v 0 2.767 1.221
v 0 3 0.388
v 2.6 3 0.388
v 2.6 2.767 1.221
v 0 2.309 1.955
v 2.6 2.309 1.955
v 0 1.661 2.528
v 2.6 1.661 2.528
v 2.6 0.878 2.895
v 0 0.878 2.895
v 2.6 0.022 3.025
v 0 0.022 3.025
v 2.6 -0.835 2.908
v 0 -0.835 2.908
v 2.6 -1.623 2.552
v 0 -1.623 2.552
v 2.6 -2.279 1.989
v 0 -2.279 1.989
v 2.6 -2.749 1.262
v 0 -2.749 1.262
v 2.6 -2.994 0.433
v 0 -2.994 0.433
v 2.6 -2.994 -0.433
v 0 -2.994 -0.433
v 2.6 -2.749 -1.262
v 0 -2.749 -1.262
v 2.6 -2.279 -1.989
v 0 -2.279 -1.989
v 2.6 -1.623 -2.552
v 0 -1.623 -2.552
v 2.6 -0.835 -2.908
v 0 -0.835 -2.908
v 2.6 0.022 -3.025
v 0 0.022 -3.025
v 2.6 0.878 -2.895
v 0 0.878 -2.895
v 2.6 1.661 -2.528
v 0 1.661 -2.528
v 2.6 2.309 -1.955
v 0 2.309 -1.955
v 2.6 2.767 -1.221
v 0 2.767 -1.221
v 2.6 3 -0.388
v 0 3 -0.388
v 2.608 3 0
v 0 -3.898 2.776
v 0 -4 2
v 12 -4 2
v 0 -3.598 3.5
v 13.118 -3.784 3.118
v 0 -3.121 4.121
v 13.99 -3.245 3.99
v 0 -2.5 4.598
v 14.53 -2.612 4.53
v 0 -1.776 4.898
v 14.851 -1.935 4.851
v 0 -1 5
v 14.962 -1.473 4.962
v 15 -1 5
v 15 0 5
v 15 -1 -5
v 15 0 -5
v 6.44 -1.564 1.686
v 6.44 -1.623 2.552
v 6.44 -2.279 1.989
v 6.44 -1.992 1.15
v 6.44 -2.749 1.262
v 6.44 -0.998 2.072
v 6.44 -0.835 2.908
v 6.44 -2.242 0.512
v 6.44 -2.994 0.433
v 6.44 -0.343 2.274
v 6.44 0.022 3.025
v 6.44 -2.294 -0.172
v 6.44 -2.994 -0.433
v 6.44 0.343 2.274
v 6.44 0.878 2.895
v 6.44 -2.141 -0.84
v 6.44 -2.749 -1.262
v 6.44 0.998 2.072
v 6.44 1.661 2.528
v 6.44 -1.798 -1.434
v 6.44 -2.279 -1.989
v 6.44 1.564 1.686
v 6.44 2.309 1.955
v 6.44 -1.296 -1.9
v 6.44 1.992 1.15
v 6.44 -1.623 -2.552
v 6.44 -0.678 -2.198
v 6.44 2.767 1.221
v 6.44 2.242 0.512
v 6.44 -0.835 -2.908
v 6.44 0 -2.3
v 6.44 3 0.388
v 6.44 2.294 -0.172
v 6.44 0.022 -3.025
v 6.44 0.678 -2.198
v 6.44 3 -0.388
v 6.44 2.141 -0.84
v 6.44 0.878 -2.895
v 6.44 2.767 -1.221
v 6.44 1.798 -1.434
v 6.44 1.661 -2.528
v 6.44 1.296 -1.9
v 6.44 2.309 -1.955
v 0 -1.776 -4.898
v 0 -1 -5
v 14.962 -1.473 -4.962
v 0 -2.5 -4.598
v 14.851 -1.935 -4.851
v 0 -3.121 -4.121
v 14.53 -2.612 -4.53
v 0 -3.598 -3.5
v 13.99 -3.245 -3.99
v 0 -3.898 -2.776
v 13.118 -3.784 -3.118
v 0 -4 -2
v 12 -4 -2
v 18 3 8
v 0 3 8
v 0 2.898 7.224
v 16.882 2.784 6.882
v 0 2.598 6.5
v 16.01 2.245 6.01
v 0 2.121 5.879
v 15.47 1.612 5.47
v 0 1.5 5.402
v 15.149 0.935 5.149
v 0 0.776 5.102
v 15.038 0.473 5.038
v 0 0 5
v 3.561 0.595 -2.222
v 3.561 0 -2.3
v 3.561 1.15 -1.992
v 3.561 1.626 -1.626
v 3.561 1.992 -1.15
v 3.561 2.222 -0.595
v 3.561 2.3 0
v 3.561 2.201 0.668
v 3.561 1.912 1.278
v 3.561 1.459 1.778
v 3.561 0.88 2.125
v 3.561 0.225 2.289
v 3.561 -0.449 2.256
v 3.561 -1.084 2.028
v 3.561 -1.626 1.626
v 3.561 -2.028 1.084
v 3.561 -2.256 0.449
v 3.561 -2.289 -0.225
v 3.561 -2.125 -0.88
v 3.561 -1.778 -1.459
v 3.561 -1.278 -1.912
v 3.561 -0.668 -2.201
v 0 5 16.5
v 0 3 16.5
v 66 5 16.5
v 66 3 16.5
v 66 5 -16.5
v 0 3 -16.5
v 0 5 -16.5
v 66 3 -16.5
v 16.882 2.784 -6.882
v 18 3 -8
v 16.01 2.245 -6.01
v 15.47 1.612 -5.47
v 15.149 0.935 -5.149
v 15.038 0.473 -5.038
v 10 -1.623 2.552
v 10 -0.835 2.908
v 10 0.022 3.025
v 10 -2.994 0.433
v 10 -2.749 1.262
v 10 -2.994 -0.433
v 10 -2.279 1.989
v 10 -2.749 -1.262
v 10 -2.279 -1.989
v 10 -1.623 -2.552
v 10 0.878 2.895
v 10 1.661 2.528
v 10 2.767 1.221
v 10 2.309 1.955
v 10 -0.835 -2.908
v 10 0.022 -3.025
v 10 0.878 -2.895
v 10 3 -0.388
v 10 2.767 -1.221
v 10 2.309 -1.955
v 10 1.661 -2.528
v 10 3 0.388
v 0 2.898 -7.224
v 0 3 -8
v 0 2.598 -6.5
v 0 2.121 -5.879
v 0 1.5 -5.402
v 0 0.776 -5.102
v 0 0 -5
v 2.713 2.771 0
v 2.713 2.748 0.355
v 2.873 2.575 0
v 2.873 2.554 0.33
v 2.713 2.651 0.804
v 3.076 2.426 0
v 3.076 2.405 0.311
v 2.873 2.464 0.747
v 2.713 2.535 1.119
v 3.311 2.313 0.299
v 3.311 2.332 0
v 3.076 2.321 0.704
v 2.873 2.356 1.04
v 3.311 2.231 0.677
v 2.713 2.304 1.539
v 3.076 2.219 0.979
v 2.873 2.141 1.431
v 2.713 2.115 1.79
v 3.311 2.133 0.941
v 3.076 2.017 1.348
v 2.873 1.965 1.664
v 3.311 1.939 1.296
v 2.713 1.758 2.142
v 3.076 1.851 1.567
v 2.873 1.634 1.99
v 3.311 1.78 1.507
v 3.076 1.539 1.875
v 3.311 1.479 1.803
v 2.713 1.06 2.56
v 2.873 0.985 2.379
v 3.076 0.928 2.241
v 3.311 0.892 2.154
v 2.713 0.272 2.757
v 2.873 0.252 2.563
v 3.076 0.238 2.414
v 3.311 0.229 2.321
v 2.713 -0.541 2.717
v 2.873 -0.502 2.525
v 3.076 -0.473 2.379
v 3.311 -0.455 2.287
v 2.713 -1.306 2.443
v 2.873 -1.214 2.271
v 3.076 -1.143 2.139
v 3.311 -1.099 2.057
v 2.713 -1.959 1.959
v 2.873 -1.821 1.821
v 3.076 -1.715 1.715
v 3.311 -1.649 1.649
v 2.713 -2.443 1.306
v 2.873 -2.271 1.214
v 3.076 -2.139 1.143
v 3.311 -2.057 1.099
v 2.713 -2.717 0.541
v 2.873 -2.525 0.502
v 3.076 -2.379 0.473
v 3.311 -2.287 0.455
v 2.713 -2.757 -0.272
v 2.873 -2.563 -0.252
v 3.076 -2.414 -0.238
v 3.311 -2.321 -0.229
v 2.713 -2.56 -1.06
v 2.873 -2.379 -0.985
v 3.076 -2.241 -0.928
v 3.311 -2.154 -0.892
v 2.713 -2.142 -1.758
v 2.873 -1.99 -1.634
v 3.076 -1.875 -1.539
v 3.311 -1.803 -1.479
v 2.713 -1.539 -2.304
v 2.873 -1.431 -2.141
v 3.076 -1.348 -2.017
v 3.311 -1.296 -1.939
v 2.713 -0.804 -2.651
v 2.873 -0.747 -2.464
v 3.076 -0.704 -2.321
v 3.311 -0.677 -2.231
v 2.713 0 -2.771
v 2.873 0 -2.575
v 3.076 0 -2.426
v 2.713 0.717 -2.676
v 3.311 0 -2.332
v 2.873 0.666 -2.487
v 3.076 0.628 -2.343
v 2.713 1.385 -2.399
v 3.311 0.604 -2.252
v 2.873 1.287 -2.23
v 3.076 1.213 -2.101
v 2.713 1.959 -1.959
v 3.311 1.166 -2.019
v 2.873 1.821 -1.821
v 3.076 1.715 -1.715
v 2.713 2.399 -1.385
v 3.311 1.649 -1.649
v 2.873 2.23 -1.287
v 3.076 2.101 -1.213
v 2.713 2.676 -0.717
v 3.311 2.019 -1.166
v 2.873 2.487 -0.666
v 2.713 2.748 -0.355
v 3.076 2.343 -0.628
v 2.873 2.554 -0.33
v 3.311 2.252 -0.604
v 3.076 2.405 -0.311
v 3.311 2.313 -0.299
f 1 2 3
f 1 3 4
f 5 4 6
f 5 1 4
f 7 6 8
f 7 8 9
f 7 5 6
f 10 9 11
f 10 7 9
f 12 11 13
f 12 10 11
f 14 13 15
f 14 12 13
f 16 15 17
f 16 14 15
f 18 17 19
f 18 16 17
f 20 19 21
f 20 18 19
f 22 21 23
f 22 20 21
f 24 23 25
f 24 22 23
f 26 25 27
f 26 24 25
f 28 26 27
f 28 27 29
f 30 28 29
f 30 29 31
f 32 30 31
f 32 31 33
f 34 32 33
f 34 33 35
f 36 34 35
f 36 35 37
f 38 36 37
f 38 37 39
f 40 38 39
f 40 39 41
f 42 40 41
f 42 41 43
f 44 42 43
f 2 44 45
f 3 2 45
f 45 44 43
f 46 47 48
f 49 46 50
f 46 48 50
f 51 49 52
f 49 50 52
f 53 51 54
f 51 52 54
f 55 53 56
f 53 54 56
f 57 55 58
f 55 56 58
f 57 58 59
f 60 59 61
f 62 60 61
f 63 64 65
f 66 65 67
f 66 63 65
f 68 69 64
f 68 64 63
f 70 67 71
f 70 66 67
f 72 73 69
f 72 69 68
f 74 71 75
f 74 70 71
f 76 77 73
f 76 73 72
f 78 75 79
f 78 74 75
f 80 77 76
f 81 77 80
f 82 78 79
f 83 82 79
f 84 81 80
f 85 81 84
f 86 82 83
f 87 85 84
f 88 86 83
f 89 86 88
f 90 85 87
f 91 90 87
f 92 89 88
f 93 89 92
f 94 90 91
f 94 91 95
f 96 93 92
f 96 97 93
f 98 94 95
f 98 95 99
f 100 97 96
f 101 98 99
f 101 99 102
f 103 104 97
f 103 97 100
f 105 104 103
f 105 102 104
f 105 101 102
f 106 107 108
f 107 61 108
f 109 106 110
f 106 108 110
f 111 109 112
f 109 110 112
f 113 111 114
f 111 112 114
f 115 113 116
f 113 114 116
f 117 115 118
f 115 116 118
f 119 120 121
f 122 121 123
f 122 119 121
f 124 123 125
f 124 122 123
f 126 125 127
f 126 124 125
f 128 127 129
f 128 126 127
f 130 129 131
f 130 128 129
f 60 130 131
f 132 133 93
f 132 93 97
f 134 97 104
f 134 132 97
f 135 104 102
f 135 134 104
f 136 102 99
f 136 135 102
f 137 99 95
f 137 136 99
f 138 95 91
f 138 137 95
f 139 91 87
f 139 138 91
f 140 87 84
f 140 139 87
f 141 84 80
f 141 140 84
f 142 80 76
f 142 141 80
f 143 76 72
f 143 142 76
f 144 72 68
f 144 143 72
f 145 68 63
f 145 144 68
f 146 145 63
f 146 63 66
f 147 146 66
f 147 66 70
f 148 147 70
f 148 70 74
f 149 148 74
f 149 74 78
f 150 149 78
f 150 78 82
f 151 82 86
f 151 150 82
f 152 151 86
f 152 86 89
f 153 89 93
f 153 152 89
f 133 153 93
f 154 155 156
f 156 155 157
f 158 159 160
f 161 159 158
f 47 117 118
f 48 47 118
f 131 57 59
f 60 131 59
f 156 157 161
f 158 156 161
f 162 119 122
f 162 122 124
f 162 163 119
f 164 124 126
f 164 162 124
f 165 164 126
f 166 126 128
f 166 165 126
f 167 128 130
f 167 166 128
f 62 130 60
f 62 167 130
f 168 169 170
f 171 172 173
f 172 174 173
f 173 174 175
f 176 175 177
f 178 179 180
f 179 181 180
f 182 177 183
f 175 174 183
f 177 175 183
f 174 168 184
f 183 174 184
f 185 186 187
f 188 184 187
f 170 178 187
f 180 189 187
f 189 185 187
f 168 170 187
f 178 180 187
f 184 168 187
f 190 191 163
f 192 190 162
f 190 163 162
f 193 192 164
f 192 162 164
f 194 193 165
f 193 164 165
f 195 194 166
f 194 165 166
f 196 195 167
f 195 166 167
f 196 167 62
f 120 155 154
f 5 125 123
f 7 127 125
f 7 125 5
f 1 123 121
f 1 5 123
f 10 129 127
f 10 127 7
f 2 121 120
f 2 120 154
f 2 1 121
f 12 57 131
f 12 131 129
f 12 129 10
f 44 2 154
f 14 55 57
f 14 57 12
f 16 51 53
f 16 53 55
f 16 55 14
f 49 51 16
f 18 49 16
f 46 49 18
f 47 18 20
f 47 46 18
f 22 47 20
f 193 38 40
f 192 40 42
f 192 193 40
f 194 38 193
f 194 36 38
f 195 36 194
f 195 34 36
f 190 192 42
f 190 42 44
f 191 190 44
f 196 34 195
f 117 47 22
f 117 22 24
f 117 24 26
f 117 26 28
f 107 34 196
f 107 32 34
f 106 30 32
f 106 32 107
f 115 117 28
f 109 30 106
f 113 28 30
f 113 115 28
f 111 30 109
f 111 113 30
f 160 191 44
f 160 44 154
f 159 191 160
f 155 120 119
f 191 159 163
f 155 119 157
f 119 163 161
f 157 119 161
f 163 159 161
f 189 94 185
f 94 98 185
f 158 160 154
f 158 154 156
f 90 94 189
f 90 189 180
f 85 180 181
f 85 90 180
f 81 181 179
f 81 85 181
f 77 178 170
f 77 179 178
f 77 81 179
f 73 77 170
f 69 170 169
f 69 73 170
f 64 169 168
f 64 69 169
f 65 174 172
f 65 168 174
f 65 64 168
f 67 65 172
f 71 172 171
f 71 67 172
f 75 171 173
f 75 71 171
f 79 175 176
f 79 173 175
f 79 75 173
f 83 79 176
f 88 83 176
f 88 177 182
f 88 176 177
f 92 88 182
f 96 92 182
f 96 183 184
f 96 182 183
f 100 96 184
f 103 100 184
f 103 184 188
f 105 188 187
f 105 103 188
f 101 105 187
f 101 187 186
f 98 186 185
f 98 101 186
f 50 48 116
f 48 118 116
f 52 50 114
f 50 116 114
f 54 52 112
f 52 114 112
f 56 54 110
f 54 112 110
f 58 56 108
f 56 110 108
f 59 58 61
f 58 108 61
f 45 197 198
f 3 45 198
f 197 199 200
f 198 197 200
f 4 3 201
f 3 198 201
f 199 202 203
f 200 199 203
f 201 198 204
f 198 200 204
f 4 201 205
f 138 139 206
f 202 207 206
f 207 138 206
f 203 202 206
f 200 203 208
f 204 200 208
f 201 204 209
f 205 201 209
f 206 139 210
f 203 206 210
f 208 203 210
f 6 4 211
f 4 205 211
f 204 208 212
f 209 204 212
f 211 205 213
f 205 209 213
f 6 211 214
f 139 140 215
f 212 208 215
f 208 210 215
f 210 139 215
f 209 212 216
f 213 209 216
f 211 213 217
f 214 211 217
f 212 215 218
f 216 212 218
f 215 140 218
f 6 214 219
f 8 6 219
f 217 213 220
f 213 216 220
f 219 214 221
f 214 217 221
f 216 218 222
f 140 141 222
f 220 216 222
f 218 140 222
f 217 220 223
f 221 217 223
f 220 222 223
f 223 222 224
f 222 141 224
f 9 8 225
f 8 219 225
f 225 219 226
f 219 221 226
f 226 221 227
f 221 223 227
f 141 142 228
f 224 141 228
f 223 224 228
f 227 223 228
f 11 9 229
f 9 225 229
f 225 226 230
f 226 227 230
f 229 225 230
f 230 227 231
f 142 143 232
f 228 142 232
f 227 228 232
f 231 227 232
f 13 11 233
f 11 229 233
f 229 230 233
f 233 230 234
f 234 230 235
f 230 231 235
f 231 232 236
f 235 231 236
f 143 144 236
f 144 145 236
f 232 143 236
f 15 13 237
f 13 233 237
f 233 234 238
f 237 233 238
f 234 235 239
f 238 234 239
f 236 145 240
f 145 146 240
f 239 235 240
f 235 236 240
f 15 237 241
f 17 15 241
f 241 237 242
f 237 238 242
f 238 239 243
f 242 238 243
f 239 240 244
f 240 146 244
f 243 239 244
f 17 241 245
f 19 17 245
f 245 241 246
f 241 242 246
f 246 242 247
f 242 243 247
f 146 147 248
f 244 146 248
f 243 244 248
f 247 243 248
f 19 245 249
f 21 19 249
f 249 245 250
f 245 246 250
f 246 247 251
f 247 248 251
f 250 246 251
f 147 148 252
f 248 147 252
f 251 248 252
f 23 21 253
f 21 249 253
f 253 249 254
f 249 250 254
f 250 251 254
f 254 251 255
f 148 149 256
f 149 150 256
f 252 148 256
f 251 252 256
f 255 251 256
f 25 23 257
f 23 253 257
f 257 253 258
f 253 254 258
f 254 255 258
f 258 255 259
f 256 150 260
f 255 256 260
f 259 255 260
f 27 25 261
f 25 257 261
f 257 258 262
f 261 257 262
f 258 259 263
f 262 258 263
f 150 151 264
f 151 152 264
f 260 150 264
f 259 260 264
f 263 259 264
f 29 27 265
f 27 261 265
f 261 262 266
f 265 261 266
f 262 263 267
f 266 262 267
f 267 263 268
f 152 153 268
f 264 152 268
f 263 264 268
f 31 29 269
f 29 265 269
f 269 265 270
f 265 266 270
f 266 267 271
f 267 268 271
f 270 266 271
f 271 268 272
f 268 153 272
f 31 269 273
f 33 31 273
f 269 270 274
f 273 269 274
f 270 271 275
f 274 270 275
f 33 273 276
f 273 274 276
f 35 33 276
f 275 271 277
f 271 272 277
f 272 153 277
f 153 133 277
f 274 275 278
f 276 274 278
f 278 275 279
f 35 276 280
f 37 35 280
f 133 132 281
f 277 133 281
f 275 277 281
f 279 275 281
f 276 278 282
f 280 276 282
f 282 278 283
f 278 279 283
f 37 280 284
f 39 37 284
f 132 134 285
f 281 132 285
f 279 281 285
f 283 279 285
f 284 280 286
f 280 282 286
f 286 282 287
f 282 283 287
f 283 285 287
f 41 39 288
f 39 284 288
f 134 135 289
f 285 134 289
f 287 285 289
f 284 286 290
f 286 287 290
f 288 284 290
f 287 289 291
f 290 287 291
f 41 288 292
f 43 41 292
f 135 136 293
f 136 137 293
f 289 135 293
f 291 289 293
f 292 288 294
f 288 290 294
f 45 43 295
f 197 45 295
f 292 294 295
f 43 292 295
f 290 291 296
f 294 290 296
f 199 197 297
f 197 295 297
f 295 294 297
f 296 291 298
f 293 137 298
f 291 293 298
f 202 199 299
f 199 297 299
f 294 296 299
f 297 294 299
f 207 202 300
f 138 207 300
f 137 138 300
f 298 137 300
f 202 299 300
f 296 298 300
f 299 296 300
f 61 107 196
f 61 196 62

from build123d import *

# Parameters (mm, degrees)
BOSS_EXTRUDE1_DEPTH      = 3
BOSS_EXTRUDE1_DEPTH_BACK = 4
SKETCH1_W                = 15
SKETCH1_H                = 10
SKETCH2_R                = 2.3
CUT_EXTRUDE3_DEPTH       = 10
SKETCH2_4_R              = 3.025
SKETCH2_4_R_2            = 2.3
CUT_EXTRUDE4_DEPTH       = 2.6
CUT_EXTRUDE5_START       = 6.44
SKETCH2_5_R              = 3.025
SKETCH2_5_R_2            = 2.3
CUT_EXTRUDE5_DEPTH       = 3.56
SKETCH3_W                = 66
SKETCH3_H                = 33
BOSS_EXTRUDE2_DEPTH      = 2
FILLET2_R                = 3
FILLET3_R                = 3


with BuildPart() as part:
    # Sketch1 → Boss-Extrude1 (new, two sides: drawn at the far end of the back side and taken through both)
    with BuildSketch(Plane(origin=(0, 0, 0), x_dir=(1, 0, 0), z_dir=(0, 1, 0)).offset(-BOSS_EXTRUDE1_DEPTH_BACK)):
        with Locations((7.5, 0)):
            Rectangle(SKETCH1_W, SKETCH1_H)
    extrude(amount=BOSS_EXTRUDE1_DEPTH + BOSS_EXTRUDE1_DEPTH_BACK)

    # Sketch2 → Cut-Extrude3 (cut)
    with BuildSketch(Plane(origin=(0, 0, 0), x_dir=(0, 0, -1), z_dir=(1, 0, 0))):
        Circle(SKETCH2_R)
    extrude(amount=CUT_EXTRUDE3_DEPTH, mode=Mode.SUBTRACT)

    # Sketch2<4> → Cut-Extrude4 (cut)
    with BuildSketch(Plane(origin=(0, 0, 0), x_dir=(0, 0, -1), z_dir=(1, 0, 0))):
        Circle(SKETCH2_4_R)
        Circle(SKETCH2_4_R_2, mode=Mode.SUBTRACT)
    extrude(amount=CUT_EXTRUDE4_DEPTH, mode=Mode.SUBTRACT)

    # Sketch2<5> → Cut-Extrude5 (cut)
    with BuildSketch(Plane(origin=(0, 0, 0), x_dir=(0, 0, -1), z_dir=(1, 0, 0)).offset(CUT_EXTRUDE5_START)):
        Circle(SKETCH2_5_R)
        Circle(SKETCH2_5_R_2, mode=Mode.SUBTRACT)
    extrude(amount=CUT_EXTRUDE5_DEPTH, mode=Mode.SUBTRACT)

    # Fillet1: read off the stored shape, not the designer's step
    # Fillet1 outline → Fillet1 (revolve, cut)
    with BuildSketch(Plane.YX):
        with BuildLine():
            Line((2.3, 2.6), (3.025000061, 2.599999982))
            ThreePointArc((3.025000061, 2.599999982), (2.501564048, 2.959364472), (2.3, 3.561444226))
            Line((2.3, 3.561444226), (2.3, 2.6))
        make_face()
    revolve(axis=Axis((0, 0, 0), (1, 0, 0)), mode=Mode.SUBTRACT)

    # Sketch3 → Boss-Extrude2 (add)
    with BuildSketch(Plane(origin=(0, 3, 0), x_dir=(1, 0, 0), z_dir=(0, 1, 0))):
        with Locations((33, 0)):
            Rectangle(SKETCH3_W, SKETCH3_H)
    extrude(amount=BOSS_EXTRUDE2_DEPTH)

    # Fillet2
    fillet2_edges = [part.edges().sort_by_distance(p)[0] for p in [
        (7.5, 3, 5),
        (15, 3, 0),
        (7.5, 3, -5),
    ]]
    fillet(fillet2_edges, radius=FILLET2_R)

    # Fillet3
    fillet3_edges = [part.edges().sort_by_distance(p)[0] for p in [
        (15, -4, 0),
        (7.5, -4, -5),
        (7.5, -4, 5),
    ]]
    fillet(fillet3_edges, radius=FILLET3_R)


solid = part.part
